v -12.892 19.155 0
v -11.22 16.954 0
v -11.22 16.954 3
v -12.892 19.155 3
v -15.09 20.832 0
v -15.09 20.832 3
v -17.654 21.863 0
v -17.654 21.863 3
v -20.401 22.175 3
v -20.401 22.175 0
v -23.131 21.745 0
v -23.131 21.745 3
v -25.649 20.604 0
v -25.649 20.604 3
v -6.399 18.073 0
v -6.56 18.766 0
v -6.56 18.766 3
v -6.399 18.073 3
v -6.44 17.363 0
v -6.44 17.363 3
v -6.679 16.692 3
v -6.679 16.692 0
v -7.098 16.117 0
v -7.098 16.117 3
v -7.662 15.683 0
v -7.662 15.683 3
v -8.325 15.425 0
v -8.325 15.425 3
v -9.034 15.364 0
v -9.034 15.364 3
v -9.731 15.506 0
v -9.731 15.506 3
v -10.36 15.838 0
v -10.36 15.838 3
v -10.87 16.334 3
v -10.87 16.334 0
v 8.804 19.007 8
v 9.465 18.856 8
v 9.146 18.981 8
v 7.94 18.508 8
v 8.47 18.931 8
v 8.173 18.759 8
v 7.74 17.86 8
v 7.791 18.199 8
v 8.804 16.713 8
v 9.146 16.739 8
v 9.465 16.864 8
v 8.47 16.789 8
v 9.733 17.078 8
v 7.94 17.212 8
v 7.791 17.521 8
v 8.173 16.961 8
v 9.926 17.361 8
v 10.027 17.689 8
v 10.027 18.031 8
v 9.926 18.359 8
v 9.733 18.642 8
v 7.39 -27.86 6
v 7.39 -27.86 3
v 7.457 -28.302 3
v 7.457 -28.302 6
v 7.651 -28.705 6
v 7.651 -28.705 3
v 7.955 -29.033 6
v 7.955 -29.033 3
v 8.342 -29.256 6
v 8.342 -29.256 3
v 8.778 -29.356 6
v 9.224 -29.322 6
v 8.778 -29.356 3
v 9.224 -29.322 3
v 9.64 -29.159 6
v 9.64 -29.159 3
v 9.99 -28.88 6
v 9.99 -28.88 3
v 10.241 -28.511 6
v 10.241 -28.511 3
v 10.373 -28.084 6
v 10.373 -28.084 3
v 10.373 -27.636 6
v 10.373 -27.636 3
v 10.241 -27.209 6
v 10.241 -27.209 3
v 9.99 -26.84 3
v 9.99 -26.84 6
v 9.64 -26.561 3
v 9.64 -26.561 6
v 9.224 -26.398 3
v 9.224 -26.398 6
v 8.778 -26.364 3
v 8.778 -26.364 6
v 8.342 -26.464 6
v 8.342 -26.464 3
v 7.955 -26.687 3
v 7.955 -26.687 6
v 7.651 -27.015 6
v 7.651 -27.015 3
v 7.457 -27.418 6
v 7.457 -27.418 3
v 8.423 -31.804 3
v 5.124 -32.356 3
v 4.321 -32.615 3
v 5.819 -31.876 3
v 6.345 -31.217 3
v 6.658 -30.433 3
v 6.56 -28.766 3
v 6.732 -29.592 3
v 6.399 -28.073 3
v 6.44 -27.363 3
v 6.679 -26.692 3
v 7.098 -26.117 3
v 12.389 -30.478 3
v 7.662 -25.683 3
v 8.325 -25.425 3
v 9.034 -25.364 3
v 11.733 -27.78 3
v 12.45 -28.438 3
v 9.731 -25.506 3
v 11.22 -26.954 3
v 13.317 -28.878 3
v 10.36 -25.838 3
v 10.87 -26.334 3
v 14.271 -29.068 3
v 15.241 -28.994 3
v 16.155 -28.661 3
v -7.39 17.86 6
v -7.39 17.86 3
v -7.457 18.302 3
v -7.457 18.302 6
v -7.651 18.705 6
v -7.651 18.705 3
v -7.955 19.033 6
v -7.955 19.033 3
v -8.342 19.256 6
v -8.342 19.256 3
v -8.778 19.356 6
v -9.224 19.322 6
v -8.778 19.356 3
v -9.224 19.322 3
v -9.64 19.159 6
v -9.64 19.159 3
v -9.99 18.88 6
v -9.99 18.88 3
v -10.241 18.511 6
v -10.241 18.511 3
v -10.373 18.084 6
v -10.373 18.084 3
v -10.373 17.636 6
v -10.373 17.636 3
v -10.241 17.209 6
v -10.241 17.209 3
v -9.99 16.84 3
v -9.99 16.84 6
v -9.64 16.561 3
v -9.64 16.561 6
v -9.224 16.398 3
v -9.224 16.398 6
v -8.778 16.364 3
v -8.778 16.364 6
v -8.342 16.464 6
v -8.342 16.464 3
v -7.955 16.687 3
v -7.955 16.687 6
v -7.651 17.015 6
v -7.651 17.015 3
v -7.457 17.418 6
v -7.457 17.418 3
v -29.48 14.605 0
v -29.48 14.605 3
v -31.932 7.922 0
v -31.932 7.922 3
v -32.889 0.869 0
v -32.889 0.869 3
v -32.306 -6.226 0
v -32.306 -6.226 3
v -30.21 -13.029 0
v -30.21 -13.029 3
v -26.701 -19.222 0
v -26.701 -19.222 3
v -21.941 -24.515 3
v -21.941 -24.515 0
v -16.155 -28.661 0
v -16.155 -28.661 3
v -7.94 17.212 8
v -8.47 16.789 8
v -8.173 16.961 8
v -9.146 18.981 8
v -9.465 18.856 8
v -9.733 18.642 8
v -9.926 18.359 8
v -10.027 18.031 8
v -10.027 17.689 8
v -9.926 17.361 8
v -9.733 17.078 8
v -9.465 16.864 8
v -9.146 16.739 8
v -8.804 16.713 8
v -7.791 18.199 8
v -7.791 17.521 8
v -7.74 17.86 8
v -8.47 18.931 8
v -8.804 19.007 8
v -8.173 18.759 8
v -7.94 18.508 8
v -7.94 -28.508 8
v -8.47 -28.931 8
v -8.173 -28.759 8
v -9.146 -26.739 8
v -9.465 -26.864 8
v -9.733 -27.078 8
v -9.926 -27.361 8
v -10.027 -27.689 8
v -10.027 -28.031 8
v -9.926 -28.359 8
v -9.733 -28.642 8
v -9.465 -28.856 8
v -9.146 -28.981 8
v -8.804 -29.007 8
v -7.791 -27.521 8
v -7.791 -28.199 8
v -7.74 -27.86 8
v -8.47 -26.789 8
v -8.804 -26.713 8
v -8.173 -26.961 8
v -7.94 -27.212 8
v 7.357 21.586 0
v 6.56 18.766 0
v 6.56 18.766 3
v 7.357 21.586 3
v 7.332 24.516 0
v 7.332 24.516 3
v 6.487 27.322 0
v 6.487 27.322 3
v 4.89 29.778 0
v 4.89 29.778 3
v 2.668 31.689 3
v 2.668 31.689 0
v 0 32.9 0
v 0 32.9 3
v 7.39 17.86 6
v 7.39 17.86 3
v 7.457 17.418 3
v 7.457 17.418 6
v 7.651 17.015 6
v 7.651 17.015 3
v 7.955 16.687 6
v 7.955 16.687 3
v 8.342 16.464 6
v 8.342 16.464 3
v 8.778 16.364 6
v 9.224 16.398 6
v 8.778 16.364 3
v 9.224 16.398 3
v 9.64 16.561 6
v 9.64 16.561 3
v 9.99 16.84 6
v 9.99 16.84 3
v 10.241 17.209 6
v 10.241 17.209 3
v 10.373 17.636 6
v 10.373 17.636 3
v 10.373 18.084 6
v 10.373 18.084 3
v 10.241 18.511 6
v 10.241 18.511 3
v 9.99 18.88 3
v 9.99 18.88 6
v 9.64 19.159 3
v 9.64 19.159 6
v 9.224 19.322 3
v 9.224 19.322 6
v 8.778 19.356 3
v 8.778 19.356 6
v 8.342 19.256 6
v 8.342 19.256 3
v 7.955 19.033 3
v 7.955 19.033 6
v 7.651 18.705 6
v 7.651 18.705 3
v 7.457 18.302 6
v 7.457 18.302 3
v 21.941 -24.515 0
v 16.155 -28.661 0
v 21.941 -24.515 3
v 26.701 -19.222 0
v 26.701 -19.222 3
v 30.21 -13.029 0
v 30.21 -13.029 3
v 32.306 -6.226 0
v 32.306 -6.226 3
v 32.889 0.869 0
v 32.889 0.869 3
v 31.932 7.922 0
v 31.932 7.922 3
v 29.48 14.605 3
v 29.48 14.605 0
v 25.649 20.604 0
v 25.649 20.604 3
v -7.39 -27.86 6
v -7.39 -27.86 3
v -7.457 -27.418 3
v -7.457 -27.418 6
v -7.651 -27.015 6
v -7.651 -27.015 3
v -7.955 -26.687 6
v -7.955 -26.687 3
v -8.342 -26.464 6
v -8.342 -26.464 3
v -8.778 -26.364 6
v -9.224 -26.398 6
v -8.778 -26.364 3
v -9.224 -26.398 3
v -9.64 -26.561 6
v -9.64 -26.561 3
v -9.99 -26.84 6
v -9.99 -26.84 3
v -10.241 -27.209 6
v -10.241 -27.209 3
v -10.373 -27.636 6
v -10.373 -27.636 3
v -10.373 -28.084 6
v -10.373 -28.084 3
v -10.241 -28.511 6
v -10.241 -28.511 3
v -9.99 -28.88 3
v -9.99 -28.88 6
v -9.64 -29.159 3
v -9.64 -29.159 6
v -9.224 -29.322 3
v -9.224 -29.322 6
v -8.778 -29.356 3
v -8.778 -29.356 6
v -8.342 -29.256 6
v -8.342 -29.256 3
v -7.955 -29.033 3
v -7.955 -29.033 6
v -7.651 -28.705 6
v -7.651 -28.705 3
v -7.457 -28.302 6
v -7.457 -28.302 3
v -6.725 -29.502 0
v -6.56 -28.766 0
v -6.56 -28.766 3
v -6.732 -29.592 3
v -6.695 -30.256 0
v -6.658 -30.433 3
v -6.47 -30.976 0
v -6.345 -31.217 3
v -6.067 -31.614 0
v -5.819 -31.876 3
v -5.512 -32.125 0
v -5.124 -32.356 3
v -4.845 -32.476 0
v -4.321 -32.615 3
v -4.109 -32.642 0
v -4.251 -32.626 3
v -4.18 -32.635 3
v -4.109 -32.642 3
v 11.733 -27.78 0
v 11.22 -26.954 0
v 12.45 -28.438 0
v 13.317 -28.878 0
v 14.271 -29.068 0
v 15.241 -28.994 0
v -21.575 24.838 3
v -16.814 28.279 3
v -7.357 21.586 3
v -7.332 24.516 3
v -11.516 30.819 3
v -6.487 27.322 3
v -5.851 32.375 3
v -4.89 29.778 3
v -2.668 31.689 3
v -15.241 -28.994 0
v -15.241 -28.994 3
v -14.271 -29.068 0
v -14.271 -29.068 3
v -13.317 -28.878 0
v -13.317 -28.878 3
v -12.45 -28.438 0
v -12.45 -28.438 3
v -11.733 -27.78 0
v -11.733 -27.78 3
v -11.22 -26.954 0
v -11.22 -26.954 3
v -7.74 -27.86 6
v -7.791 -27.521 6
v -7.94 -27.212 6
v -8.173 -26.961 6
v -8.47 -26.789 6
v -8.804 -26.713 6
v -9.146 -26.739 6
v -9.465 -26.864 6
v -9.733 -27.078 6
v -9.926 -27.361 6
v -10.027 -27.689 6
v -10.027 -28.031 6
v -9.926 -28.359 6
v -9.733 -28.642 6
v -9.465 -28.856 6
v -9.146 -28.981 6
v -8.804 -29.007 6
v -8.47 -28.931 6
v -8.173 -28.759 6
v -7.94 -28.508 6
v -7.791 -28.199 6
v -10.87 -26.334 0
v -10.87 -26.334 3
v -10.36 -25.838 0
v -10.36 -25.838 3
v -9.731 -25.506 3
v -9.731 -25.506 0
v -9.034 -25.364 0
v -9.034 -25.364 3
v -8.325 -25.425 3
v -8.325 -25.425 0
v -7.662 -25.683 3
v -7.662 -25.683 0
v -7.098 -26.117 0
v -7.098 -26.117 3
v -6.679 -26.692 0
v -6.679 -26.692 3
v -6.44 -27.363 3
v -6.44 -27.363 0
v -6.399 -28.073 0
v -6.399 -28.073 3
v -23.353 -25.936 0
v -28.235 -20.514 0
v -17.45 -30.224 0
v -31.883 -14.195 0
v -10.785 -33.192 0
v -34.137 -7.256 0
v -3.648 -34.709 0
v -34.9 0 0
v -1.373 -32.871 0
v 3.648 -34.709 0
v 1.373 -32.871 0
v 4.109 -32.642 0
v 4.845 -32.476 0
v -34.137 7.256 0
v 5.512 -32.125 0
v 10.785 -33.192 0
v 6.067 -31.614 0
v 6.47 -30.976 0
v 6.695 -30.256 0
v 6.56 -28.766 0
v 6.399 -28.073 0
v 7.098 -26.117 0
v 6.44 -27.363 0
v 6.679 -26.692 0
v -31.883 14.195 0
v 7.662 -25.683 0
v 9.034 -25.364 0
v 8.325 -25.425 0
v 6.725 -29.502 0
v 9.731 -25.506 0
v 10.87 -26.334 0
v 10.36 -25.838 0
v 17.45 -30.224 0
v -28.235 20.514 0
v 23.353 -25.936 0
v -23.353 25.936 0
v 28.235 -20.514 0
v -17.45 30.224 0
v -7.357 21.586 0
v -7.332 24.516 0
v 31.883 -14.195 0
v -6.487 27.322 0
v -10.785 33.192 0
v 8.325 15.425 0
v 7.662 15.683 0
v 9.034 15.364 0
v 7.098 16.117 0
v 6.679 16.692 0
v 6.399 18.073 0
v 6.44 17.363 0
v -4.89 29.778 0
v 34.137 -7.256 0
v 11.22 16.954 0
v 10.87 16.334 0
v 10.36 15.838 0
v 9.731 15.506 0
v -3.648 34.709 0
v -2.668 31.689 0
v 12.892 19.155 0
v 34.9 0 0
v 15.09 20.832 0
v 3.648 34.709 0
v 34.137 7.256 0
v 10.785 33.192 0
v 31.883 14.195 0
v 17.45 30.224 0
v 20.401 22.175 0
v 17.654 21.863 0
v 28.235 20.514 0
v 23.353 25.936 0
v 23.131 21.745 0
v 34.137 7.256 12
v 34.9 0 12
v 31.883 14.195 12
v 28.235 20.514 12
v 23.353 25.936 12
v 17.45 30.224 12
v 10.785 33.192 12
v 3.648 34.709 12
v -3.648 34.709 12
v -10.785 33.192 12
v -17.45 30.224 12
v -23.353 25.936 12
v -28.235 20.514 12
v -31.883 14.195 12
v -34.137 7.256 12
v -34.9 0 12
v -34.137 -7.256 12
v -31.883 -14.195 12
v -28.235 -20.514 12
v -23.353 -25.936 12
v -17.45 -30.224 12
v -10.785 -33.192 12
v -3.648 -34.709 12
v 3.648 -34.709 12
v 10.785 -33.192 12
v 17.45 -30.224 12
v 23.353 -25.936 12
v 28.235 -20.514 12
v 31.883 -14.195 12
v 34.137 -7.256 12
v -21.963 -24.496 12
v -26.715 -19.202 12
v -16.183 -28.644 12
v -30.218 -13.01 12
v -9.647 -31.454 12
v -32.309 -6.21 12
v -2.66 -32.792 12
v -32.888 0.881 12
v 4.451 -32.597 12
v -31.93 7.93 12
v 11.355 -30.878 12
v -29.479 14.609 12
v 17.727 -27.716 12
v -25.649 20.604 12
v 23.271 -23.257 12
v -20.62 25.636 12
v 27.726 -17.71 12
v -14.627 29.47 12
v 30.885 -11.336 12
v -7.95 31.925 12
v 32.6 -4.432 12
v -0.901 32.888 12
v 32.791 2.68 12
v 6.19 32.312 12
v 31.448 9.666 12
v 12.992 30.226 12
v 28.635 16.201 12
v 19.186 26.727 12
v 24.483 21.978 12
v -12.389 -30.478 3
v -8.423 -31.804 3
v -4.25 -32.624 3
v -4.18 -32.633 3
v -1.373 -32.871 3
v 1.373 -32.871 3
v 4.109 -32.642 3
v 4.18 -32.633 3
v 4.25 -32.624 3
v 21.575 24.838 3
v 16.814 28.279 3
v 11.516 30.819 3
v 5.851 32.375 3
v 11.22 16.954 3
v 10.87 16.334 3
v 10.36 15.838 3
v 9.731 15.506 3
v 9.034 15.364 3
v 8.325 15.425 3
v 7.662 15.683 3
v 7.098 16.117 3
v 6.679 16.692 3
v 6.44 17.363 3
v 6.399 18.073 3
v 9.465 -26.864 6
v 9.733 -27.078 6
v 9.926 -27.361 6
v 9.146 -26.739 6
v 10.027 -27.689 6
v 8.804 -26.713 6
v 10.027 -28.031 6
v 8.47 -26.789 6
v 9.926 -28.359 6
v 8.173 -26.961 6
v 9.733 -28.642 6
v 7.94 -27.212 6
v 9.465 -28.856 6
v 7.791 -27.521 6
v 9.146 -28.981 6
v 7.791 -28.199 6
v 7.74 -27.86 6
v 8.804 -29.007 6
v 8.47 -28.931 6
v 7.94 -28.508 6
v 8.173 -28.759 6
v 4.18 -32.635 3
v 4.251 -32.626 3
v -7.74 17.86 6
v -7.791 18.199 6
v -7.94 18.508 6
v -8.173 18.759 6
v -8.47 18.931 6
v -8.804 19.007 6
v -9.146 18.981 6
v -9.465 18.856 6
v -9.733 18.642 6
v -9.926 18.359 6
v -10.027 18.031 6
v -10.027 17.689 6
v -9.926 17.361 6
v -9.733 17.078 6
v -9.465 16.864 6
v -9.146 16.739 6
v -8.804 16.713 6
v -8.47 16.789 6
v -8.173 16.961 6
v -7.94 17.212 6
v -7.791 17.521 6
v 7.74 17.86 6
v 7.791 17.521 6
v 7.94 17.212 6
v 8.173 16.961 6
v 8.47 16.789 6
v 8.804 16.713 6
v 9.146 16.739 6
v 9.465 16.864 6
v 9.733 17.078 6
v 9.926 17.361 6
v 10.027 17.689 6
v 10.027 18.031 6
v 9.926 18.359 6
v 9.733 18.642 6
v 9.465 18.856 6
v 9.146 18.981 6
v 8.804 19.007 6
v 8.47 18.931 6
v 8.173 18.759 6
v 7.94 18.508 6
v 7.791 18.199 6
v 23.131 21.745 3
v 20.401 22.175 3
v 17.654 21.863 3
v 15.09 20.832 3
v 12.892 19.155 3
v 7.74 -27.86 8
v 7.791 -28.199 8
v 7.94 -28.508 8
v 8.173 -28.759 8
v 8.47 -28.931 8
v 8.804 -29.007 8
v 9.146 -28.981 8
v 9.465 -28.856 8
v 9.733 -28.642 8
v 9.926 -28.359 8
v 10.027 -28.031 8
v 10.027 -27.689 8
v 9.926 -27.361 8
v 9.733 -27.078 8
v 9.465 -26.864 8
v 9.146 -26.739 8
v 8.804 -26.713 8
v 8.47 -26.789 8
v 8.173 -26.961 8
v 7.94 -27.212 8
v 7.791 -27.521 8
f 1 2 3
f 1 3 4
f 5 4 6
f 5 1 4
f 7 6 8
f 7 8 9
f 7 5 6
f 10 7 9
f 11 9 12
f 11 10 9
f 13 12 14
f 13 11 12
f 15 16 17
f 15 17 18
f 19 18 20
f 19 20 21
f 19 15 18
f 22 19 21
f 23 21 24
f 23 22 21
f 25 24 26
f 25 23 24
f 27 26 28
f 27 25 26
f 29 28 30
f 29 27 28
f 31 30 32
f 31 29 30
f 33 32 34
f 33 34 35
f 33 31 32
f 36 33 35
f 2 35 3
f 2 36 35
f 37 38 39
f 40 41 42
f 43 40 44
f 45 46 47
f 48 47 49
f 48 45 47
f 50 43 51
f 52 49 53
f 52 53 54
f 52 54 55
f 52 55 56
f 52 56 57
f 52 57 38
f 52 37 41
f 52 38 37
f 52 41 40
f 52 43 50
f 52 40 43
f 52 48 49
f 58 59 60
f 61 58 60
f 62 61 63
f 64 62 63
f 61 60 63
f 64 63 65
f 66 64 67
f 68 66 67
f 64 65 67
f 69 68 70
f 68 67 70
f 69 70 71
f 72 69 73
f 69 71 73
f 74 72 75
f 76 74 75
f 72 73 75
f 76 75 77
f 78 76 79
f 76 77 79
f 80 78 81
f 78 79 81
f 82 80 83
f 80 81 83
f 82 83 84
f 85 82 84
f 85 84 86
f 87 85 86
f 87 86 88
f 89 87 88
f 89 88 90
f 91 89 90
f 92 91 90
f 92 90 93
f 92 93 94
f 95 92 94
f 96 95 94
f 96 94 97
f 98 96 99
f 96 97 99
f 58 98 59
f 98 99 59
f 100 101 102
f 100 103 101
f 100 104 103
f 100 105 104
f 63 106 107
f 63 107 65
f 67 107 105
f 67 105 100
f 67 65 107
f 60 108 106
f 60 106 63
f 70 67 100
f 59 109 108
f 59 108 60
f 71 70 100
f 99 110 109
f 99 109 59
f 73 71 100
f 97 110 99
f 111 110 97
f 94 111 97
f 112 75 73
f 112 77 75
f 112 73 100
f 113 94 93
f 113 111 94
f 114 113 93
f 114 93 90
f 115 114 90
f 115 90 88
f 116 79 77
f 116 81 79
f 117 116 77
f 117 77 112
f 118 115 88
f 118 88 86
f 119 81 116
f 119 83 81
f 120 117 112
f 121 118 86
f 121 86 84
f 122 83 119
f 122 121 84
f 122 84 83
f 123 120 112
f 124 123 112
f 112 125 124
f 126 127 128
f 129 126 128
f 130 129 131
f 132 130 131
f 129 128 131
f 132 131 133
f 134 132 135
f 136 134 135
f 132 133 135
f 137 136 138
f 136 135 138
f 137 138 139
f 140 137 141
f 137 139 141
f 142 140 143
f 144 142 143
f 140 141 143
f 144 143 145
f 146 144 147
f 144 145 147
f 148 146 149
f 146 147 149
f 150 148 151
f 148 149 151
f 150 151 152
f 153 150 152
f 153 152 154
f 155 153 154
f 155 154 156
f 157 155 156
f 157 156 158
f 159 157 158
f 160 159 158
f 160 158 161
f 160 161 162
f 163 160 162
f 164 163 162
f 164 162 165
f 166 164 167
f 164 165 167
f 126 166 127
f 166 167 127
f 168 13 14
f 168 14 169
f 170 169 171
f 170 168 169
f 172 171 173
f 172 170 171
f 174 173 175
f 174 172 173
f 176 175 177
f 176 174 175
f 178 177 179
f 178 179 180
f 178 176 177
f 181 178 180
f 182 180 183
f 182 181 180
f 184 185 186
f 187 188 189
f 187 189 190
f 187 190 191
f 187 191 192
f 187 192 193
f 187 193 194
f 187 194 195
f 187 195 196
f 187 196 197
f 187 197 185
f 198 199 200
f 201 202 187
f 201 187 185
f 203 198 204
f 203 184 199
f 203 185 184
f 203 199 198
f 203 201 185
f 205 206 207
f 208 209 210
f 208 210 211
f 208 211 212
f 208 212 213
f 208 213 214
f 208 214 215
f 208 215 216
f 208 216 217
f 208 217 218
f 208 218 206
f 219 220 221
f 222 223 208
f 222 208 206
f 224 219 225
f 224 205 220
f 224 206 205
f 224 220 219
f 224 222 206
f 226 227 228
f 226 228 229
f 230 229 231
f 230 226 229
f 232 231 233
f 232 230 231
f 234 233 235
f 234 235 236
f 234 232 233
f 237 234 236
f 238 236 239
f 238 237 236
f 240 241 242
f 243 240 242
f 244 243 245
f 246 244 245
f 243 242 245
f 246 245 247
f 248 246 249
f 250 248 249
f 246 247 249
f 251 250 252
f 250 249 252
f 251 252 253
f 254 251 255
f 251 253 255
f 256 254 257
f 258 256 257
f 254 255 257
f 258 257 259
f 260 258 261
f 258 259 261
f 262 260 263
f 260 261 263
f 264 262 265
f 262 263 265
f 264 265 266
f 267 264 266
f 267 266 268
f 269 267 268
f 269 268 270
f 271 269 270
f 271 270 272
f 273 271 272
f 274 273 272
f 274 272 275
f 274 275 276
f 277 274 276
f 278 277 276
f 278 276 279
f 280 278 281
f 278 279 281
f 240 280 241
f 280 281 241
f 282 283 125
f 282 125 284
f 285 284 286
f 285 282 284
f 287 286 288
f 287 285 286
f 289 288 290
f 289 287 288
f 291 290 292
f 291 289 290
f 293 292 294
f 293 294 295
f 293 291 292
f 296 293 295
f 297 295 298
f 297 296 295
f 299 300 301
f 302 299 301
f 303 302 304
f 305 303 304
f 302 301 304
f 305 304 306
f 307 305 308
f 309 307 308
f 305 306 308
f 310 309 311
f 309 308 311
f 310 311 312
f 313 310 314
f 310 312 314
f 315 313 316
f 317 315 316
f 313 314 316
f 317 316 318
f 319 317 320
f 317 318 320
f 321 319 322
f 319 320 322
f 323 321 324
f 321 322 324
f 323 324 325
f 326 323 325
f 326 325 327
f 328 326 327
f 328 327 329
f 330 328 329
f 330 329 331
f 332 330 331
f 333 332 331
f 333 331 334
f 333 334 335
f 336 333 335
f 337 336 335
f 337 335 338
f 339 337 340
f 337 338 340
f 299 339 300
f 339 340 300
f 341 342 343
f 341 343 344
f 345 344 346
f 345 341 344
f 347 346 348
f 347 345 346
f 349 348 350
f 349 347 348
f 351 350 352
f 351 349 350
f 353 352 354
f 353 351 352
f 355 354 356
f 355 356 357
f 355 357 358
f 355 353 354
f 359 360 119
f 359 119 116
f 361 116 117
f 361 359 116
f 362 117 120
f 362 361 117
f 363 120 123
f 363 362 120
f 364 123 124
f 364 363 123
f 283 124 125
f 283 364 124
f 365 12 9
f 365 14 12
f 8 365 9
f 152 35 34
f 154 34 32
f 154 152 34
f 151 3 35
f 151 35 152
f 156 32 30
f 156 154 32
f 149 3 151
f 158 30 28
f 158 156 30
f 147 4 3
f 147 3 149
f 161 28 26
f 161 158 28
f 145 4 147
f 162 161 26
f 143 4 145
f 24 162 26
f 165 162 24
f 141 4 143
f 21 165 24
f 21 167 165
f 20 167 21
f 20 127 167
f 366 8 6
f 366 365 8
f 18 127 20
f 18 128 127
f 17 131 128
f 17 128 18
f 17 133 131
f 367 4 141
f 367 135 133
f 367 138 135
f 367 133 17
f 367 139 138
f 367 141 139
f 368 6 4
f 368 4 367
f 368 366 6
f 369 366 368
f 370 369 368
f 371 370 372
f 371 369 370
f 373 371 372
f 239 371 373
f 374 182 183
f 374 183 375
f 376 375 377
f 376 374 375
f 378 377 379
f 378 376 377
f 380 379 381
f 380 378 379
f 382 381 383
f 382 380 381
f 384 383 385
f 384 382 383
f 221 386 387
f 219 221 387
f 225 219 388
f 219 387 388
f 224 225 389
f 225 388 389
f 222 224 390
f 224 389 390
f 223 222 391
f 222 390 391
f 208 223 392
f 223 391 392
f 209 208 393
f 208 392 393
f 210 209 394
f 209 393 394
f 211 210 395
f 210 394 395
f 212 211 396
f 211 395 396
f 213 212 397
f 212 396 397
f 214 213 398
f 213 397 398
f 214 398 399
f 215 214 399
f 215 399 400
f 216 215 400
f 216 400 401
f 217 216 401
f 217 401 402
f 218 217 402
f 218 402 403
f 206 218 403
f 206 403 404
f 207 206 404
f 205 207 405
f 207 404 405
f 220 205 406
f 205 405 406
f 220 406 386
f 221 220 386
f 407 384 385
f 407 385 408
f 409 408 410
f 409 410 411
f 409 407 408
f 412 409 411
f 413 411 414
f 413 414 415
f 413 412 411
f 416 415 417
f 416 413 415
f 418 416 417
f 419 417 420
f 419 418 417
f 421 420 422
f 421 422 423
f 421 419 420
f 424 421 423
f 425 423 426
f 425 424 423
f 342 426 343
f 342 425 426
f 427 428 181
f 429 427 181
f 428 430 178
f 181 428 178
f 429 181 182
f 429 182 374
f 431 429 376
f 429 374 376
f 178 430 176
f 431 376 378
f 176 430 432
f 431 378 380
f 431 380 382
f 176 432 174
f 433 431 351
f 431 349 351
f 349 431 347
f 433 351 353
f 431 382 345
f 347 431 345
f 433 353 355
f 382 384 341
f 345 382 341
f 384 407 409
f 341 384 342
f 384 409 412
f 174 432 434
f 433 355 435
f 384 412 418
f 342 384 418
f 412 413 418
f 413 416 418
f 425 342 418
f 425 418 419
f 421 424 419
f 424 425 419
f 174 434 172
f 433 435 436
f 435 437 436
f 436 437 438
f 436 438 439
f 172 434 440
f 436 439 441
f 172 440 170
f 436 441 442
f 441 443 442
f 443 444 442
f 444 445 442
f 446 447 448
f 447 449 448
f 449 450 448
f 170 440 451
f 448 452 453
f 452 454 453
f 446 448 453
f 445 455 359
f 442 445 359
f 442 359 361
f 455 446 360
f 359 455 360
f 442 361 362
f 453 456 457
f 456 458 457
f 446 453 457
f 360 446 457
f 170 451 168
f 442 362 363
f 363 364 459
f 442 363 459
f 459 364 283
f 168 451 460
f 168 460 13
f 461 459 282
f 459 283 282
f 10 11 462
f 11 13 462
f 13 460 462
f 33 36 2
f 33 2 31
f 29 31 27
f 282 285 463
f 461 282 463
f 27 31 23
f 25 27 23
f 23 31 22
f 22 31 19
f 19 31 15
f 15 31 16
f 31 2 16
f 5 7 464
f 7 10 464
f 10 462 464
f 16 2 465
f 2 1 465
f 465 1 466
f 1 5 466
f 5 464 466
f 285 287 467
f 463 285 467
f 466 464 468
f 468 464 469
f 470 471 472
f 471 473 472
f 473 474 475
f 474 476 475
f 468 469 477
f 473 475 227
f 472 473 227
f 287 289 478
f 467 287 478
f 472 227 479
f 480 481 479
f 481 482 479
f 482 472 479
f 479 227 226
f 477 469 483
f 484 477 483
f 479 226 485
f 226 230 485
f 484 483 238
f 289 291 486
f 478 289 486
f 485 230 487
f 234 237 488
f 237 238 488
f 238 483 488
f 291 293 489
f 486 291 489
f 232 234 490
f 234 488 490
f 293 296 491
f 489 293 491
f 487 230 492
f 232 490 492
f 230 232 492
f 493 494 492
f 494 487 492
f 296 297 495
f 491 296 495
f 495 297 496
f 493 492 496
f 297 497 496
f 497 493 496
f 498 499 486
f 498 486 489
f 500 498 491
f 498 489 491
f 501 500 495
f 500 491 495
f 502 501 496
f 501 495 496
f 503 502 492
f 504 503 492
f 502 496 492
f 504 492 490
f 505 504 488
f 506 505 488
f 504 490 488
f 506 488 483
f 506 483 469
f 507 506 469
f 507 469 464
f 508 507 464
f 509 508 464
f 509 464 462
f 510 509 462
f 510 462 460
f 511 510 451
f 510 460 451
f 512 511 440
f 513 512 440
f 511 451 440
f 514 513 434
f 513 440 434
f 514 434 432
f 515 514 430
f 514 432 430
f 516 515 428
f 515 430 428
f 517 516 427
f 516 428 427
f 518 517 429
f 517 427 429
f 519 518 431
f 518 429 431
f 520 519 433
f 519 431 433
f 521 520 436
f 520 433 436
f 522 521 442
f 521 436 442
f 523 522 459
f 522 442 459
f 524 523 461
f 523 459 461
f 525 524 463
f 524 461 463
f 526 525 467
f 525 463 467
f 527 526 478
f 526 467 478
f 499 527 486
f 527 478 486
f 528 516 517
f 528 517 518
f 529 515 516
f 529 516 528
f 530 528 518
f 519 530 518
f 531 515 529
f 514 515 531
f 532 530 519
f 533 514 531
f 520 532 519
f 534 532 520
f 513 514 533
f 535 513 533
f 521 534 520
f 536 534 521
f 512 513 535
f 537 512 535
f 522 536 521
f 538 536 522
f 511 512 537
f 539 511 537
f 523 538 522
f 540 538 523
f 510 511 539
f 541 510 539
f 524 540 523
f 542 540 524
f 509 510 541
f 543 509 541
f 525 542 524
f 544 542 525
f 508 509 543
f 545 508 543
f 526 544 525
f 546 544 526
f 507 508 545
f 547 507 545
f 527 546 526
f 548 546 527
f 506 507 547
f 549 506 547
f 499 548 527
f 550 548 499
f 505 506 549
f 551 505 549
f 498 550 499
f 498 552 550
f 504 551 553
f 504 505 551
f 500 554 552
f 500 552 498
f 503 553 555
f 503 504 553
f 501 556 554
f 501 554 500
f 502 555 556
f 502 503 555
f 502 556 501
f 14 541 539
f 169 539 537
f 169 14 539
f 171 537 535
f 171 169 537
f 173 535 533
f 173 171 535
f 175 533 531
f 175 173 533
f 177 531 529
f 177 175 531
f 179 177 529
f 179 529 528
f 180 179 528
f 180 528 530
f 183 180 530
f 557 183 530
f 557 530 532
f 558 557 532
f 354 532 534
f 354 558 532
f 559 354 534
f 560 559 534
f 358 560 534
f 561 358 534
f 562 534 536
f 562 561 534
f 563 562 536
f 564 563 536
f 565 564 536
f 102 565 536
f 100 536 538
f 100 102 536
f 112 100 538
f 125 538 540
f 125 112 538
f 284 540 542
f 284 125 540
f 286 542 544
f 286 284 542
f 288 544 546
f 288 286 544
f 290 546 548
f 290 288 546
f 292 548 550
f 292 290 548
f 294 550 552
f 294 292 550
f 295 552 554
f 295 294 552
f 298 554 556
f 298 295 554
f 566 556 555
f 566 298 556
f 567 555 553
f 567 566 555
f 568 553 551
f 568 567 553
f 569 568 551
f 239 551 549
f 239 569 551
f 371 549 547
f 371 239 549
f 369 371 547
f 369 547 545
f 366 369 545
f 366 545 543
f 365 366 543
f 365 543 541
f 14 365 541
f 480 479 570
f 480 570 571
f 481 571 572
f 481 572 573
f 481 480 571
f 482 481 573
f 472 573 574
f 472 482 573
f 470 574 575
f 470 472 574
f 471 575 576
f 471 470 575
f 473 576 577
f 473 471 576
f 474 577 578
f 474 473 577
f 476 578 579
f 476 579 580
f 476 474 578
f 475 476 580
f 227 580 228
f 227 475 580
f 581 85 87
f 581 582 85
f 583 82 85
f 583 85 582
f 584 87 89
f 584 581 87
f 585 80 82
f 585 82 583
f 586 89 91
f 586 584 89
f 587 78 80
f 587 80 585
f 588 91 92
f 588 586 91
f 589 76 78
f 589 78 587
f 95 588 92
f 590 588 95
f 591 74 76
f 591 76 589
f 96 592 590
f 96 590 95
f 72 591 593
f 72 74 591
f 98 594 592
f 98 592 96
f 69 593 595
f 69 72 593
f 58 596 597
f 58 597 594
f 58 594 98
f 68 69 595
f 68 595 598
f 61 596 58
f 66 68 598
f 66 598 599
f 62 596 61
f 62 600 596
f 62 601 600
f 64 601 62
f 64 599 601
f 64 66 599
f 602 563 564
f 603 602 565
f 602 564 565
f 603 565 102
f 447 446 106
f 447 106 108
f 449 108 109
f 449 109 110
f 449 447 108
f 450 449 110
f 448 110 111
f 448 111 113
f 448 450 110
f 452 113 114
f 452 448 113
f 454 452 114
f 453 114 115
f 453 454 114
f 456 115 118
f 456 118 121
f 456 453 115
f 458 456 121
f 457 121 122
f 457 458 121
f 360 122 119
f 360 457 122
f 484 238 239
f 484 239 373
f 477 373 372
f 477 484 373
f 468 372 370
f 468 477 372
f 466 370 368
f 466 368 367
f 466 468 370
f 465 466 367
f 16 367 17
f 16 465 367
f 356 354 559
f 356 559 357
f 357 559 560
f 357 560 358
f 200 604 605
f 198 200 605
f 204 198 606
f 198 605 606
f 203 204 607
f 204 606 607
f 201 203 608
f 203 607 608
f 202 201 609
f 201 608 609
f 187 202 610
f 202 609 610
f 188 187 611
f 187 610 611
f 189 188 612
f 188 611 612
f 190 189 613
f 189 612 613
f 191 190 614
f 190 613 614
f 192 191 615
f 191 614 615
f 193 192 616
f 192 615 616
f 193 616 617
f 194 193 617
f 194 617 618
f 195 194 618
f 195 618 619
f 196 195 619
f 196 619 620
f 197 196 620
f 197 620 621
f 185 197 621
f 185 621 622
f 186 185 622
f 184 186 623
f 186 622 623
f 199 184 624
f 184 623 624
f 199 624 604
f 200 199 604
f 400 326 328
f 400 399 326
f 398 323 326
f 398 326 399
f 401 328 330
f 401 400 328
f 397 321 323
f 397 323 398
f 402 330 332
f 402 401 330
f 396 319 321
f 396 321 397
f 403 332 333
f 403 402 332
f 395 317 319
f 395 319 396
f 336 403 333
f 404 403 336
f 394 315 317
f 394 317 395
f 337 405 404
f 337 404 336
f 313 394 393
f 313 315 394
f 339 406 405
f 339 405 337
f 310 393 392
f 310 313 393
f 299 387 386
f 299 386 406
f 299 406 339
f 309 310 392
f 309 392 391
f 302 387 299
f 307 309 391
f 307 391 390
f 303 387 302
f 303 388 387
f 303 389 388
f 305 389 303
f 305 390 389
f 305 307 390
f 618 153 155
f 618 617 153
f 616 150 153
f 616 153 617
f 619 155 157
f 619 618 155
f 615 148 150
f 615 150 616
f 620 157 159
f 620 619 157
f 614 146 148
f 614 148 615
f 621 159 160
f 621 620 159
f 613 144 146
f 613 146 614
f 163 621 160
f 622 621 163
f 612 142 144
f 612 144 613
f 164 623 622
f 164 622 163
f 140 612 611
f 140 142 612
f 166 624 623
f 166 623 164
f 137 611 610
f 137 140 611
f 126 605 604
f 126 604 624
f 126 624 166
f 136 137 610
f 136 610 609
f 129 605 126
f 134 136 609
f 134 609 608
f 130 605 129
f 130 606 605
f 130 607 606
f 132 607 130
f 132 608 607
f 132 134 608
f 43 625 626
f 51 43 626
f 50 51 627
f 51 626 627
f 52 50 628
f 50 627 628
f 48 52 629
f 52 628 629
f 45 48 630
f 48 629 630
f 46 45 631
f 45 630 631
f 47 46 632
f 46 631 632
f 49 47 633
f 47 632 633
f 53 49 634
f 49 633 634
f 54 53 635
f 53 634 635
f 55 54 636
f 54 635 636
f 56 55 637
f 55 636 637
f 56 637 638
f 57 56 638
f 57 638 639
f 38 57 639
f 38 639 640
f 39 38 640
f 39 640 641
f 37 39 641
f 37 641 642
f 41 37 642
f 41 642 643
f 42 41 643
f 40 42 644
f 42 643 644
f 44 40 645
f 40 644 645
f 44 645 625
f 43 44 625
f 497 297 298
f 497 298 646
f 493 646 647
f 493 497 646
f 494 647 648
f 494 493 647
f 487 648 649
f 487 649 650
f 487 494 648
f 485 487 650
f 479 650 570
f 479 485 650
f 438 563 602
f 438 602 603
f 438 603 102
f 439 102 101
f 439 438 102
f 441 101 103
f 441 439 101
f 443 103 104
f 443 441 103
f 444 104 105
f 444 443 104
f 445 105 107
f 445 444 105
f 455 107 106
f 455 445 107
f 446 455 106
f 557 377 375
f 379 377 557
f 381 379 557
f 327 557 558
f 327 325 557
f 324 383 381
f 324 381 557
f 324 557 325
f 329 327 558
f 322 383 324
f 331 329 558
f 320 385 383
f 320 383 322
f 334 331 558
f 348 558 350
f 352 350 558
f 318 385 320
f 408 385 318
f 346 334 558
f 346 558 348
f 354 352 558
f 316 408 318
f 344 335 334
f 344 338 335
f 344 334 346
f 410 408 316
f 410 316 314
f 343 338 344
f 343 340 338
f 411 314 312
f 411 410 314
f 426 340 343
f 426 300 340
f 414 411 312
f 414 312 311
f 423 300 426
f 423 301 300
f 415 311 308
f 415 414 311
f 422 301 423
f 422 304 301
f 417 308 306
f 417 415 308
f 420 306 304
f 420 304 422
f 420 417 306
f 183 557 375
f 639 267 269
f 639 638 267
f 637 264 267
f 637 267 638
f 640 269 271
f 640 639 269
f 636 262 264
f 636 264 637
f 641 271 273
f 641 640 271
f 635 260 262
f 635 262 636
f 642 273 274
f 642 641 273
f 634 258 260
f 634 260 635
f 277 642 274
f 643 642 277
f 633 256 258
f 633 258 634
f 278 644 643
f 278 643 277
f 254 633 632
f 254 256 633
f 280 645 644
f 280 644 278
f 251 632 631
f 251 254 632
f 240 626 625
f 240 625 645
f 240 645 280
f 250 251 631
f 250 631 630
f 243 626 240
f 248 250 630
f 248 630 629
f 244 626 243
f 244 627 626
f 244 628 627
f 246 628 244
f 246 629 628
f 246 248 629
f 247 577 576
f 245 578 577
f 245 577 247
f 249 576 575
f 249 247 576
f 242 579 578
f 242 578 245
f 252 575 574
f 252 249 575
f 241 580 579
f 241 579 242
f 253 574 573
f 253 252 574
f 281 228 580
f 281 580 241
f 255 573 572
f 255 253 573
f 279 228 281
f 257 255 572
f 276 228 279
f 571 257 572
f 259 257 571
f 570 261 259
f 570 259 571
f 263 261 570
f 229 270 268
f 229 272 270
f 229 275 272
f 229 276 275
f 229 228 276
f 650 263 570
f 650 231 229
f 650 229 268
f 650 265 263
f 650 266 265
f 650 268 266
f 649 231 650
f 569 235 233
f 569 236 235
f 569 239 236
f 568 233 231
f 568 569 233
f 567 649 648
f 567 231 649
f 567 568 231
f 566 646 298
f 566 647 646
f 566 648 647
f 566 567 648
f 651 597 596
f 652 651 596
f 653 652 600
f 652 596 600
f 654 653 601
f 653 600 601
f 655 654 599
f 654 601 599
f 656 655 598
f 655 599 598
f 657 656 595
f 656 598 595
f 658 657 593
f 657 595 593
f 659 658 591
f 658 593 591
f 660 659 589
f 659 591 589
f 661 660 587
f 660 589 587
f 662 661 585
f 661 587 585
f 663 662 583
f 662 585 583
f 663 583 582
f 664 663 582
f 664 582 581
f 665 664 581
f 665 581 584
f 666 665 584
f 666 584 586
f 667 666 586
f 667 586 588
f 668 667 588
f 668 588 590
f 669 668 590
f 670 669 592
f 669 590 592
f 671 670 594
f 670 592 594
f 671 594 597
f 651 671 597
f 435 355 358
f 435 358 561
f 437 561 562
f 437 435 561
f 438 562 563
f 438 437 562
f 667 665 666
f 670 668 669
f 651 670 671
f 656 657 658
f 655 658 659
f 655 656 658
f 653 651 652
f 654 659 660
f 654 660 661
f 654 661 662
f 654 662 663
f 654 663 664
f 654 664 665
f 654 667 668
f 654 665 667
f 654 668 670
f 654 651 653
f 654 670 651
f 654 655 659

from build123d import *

# Parameters (mm, degrees)
ESQUISSE_CORPS_R   = 34.9
BOSS_EXTRU_1_DEPTH = 3
ESQUISSE5_R        = 1.5
BOSS_EXTRU_2_DEPTH = 3
ESQUISSE6_R        = 1.15
BOSS_EXTRU_3_DEPTH = 2
ESQUISSE7_R        = 34.9
ESQUISSE7_R_2      = 32.9
BOSS_EXTRU_4_DEPTH = 9


with BuildPart() as part:
    # Esquisse_corps → Boss.-Extru.1 (new body)
    with BuildSketch(Plane.XY):
        Circle(ESQUISSE_CORPS_R)
        with BuildLine():
            ThreePointArc((-11.220011679, -26.953884347), (-7.983884347, -25.529988321), (-6.559988321, -28.766115653))
            ThreePointArc((-6.559988321, -28.766115653), (-6.289235285, -31.30799577), (-4.108913196, -32.642408495))
            ThreePointArc((-4.108913196, -32.642408495), (0, -32.9), (4.108913196, -32.642408495))
            ThreePointArc((4.108913196, -32.642408495), (6.289235285, -31.30799577), (6.559988321, -28.766115653))
            ThreePointArc((6.559988321, -28.766115653), (7.983884347, -25.529988321), (11.220011679, -26.953884347))
            ThreePointArc((11.220011679, -26.953884347), (13.316969942, -28.87783046), (16.154521733, -28.660799493))
            ThreePointArc((16.154521733, -28.660799493), (32.305537105, -6.225935459), (25.64893396, 20.604421533))
            ThreePointArc((25.64893396, 20.604421533), (17.65423242, 21.86309032), (11.220011679, 16.953884347))
            ThreePointArc((11.220011679, 16.953884347), (7.983884347, 15.529988321), (6.559988321, 18.766115653))
            ThreePointArc((6.559988321, 18.766115653), (6.487068724, 27.321563828), (0, 32.9))
            ThreePointArc((0, 32.9), (-6.487068724, 27.321563828), (-6.559988321, 18.766115653))
            ThreePointArc((-6.559988321, 18.766115653), (-7.983884347, 15.529988321), (-11.220011679, 16.953884347))
            ThreePointArc((-11.220011679, 16.953884347), (-17.65423242, 21.86309032), (-25.64893396, 20.604421533))
            ThreePointArc((-25.64893396, 20.604421533), (-32.305537105, -6.225935459), (-16.154521733, -28.660799493))
            ThreePointArc((-16.154521733, -28.660799493), (-13.316969942, -28.87783046), (-11.220011679, -26.953884347))
        make_face(mode=Mode.SUBTRACT)
    extrude(amount=BOSS_EXTRU_1_DEPTH)

    # Esquisse5 → Boss.-Extru.2 (add)
    with BuildSketch(Plane.XY.offset(3)):
        with Locations((-8.89, 17.86)):
            Circle(ESQUISSE5_R)
        with Locations((-8.89, -27.86)):
            Circle(ESQUISSE5_R)
        with Locations(Location((8.89, -27.86, 0), (0, 0, 180))):
            Circle(ESQUISSE5_R)
        with Locations(Location((8.89, 17.86, 0), (0, 0, 180))):
            Circle(ESQUISSE5_R)
    extrude(amount=BOSS_EXTRU_2_DEPTH)

    # Esquisse6 → Boss.-Extru.3 (add)
    with BuildSketch(Plane.XY.offset(6)):
        with Locations((-8.89, 17.86)):
            Circle(ESQUISSE6_R)
        with Locations((-8.89, -27.86)):
            Circle(ESQUISSE6_R)
        with Locations(Location((8.89, -27.86, 0), (0, 0, 180))):
            Circle(ESQUISSE6_R)
        with Locations(Location((8.89, 17.86, 0), (0, 0, 180))):
            Circle(ESQUISSE6_R)
    extrude(amount=BOSS_EXTRU_3_DEPTH)

    # Esquisse7 → Boss.-Extru.4 (add)
    with BuildSketch(Plane.XY.offset(3)):
        Circle(ESQUISSE7_R)
        with Locations(Location((0, 0, 0), (0, 0, 141.224227635))):
            Circle(ESQUISSE7_R_2, mode=Mode.SUBTRACT)
    extrude(amount=BOSS_EXTRU_4_DEPTH)


solid = part.part
